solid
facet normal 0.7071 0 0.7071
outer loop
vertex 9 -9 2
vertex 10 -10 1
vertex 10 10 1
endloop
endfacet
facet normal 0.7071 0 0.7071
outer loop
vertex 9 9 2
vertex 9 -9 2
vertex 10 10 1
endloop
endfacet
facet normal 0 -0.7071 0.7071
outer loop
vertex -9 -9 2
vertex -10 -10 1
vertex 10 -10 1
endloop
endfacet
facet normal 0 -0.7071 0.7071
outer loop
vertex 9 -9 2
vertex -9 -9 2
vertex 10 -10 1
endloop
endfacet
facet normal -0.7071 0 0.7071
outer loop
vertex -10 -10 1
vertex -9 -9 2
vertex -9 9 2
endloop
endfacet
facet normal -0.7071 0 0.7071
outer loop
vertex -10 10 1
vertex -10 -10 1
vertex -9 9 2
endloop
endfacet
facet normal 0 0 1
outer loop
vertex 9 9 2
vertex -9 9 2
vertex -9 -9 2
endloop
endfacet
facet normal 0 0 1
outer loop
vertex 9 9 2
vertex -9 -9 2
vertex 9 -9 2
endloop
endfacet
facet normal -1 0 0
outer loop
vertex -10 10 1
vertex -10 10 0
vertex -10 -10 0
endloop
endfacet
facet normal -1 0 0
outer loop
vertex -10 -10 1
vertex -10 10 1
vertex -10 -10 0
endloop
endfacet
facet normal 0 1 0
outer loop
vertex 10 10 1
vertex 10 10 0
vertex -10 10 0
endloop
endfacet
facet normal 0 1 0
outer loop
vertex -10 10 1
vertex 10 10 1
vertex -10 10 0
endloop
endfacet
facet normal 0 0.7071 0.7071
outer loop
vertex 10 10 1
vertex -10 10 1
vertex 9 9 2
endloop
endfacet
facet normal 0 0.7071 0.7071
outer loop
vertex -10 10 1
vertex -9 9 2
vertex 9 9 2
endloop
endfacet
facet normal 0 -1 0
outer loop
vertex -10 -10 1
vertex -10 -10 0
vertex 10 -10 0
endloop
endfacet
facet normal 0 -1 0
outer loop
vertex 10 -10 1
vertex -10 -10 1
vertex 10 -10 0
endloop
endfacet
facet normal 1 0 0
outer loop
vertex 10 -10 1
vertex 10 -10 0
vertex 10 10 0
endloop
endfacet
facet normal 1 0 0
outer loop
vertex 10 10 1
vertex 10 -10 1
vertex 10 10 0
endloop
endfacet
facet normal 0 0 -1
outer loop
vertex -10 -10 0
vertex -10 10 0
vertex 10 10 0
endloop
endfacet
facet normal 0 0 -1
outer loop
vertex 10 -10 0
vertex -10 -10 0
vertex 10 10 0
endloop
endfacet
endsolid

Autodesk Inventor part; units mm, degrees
ref_plane "YZ Plane" through (0, 0, 0) normal (1, 0, 0) x (0, 1, 0)
ref_plane "XZ Plane" through (0, 0, 0) normal (0, 1, 0) x (-1, 0, 0)
ref_plane "XY Plane" through (0, 0, 0) normal (0, 0, 1) x (1, 0, 0)
sketch "Sketch1" plane through (0, 0, 0) normal (0, 0, 1) x (1, 0, 0)
  line L0 (-10, -10) -> (10, -10)
  line L1 (10, -10) -> (10, 10)
  line L2 (10, 10) -> (-10, 10)
  line L3 (-10, 10) -> (-10, -10)
  line L4 (-10, -10) -> (10, 10) construction
  line L5 (10, -10) -> (-10, 10) construction
  point P0 (0, 0)
  dimension "d0" = 20
  dimension "d1" = 20
extrude "Extrusion1" add sketch "Sketch1" along normal blind 2
chamfer "Chamfer1" distance 1 angle 45 1 edges at (0, 10, 2)
chamfer "Chamfer2" distance 1 angle 45 3 edges at (10, -0.5, 2) (-10, -0.5, 2) (0, -10, 2)
properties part number "Bit Nhom 3060"
